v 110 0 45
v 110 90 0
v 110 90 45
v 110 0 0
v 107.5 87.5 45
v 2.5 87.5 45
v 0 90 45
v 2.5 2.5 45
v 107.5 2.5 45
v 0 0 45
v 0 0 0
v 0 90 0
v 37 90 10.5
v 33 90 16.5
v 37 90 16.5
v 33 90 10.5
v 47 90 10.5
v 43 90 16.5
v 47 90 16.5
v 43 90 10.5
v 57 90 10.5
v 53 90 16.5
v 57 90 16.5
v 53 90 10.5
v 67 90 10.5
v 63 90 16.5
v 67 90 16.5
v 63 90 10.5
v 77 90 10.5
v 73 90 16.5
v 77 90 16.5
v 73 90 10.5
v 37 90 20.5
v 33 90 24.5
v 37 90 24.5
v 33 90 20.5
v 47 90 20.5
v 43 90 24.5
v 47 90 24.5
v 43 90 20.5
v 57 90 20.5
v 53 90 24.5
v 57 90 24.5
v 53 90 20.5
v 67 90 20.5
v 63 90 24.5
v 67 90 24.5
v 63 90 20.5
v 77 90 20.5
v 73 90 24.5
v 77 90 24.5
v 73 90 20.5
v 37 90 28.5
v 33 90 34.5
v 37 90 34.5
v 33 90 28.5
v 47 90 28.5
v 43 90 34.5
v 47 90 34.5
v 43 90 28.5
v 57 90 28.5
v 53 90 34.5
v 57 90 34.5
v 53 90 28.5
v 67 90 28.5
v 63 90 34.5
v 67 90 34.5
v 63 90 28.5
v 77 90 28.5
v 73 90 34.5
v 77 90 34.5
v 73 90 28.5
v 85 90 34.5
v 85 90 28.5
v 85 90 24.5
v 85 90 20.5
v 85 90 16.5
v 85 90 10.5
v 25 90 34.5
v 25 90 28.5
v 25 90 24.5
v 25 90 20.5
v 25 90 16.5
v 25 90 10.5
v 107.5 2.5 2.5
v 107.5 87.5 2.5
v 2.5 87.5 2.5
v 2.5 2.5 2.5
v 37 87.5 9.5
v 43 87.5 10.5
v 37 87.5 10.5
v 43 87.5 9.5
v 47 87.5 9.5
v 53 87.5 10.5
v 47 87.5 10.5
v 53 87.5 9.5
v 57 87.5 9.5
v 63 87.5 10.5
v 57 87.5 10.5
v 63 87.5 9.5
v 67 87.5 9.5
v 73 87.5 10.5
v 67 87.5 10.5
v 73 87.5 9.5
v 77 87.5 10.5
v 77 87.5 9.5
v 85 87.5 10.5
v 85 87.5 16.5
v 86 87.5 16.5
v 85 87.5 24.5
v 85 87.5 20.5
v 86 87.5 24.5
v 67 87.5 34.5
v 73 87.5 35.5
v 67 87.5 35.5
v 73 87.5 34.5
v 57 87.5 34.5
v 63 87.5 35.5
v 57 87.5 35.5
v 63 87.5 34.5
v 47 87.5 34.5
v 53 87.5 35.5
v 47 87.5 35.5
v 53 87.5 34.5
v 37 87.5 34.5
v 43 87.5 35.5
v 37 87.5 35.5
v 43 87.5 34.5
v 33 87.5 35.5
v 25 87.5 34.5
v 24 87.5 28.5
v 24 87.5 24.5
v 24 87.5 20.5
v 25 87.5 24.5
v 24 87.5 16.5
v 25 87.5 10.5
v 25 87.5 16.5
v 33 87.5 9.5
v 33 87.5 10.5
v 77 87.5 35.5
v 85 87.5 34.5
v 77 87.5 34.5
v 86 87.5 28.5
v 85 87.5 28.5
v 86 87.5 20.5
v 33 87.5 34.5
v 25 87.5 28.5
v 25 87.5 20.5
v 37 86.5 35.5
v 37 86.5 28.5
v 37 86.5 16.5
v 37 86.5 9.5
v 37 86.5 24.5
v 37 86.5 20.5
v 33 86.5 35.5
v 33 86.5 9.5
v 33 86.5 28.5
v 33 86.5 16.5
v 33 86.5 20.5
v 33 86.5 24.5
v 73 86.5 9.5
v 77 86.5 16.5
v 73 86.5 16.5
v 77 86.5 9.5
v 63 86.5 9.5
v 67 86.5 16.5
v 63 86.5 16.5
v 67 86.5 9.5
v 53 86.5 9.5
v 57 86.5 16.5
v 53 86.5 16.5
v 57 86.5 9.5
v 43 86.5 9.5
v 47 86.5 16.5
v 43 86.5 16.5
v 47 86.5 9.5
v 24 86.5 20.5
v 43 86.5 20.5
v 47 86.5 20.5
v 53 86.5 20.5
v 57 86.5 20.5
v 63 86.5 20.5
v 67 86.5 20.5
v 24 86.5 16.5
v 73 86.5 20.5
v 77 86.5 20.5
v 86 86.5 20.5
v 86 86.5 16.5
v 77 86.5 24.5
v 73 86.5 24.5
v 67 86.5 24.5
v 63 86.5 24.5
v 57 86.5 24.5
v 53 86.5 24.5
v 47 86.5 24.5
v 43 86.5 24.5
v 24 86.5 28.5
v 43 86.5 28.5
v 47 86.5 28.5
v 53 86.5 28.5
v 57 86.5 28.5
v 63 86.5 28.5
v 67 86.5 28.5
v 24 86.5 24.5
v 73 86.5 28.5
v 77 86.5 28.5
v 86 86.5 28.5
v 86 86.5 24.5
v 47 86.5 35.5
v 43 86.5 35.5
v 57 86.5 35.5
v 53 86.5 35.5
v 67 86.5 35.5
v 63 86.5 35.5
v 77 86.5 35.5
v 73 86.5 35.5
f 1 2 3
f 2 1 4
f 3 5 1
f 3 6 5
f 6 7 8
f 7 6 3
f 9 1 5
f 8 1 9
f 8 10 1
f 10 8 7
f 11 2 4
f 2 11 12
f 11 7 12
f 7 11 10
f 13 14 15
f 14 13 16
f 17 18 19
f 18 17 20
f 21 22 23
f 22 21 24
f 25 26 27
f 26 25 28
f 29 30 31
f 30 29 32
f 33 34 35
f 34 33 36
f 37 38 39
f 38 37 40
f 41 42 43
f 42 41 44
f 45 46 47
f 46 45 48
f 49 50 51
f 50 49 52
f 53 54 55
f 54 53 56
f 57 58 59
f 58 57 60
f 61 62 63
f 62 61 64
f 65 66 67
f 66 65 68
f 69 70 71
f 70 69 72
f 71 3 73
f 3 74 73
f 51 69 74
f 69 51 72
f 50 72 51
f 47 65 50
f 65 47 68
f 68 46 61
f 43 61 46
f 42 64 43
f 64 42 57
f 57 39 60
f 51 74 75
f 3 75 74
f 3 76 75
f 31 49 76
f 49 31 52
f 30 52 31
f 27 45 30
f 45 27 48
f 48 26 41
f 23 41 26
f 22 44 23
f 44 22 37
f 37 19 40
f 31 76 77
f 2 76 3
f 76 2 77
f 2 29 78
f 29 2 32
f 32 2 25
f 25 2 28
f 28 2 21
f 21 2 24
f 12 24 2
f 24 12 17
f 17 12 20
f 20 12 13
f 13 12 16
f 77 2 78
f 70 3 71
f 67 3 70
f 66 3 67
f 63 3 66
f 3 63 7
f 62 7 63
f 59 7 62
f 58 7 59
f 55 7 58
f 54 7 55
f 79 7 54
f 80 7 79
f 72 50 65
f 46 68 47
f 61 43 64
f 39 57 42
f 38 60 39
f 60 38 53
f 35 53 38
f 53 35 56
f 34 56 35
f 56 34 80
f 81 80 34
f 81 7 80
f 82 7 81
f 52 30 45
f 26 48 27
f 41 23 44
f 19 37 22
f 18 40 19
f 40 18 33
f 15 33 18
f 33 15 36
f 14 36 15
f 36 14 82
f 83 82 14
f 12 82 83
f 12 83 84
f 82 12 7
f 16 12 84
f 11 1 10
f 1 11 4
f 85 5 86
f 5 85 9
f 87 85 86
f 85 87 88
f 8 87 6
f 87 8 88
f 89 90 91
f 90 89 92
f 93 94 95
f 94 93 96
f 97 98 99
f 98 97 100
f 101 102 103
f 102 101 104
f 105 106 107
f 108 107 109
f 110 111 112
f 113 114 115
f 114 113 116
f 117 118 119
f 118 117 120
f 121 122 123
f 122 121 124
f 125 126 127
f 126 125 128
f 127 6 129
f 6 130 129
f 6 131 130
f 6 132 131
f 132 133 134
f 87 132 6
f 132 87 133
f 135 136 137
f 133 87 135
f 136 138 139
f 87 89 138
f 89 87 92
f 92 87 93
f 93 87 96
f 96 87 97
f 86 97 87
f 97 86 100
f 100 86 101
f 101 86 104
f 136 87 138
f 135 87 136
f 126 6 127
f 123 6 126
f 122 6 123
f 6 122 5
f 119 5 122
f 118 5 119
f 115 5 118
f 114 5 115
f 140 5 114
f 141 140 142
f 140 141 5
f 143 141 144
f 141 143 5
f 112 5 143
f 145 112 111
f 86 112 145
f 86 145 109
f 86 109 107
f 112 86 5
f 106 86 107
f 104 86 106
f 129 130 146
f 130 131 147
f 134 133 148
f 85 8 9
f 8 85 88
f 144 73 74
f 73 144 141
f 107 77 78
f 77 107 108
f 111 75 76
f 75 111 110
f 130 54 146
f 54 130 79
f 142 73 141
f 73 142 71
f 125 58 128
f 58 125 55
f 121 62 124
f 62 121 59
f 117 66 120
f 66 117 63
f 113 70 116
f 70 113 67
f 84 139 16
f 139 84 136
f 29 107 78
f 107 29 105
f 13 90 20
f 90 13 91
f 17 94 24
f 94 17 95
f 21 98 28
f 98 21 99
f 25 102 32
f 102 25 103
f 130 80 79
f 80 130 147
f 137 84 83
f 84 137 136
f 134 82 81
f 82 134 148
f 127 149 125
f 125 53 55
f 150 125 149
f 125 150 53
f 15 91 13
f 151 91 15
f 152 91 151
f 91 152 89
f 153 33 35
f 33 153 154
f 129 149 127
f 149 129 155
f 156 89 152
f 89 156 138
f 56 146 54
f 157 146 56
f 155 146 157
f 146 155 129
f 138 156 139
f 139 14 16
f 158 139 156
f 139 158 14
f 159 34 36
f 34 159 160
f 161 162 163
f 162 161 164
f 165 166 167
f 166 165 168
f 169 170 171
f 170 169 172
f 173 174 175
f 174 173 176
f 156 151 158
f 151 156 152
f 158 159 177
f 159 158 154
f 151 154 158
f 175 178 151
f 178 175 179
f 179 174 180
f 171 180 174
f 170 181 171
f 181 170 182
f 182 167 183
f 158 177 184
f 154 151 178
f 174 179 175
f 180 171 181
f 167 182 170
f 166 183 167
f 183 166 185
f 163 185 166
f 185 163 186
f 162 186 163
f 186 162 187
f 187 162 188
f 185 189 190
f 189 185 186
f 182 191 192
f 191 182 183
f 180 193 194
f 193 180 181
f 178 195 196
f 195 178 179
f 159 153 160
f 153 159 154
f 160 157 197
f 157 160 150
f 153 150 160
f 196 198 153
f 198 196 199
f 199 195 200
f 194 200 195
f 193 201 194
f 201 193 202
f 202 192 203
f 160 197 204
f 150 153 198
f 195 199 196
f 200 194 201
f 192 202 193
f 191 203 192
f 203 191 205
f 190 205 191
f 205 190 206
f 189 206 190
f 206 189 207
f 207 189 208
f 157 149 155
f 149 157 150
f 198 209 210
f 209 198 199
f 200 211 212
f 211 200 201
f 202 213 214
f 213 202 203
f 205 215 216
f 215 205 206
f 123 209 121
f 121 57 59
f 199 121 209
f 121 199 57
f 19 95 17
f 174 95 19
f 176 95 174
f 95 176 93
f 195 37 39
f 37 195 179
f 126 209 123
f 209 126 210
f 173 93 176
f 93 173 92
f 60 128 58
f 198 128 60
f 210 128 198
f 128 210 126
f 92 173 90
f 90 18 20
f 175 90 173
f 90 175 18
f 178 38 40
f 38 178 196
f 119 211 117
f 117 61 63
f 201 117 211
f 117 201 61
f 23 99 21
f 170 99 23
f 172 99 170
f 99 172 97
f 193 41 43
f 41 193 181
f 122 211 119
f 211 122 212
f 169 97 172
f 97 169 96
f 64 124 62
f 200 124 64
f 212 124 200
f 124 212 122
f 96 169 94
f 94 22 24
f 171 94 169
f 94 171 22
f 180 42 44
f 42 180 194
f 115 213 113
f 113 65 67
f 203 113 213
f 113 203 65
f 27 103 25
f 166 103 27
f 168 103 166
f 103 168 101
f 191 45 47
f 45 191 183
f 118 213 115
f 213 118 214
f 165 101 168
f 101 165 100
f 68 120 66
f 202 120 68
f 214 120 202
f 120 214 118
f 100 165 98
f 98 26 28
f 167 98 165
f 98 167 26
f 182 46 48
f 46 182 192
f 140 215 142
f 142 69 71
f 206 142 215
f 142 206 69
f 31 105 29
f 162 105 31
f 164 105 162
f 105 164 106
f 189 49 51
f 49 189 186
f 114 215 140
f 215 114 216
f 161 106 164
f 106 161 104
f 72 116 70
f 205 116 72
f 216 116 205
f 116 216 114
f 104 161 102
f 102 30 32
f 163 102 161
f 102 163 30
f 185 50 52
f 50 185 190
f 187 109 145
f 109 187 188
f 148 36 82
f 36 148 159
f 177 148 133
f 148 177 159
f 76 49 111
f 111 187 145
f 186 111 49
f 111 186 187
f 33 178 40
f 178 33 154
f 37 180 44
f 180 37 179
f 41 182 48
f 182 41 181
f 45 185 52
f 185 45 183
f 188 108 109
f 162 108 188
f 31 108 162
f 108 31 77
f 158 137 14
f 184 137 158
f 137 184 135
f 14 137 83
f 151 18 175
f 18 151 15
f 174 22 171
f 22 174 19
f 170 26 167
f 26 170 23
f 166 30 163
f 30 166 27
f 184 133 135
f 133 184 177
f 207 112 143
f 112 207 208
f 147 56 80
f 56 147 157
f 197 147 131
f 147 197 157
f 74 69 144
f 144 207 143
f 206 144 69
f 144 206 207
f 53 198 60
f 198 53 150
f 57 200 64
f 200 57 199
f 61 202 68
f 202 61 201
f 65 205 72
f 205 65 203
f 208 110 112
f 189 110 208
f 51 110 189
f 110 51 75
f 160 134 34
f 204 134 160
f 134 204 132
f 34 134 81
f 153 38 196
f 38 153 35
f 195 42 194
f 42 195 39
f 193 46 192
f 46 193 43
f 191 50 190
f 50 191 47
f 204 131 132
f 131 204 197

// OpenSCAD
$fn = 32;

// ----------------------------------------------------------------------
// Vent box: crossgrid enclosure
// ----------------------------------------------------------------------

// --- parameters (mm) ---
box_l = 110;              // box length, X
box_w = 90;               // box width, Y
box_h = 45;               // box height, Z
wall_t = 2.5;             // shell wall thickness
win_l = 60;               // vent window width, X
win_h = 24;               // vent window height, Z
bar_w = 4;                // grid bar width
n_v = 5;                  // vertical bar count
n_h = 2;                  // horizontal bar count

win_z0 = (box_h - win_h) / 2;  // window lower edge Z
v_step = win_l / (n_v + 1);  // vertical bar step
h_step = win_h / (n_h + 1);  // horizontal bar step

difference() {
  union() {
    difference() {
      cube([box_l, box_w, box_h]);
  translate([wall_t, wall_t, wall_t])
    cube([box_l - 2 * wall_t, box_w - 2 * wall_t, box_h]);
  translate([(box_l - win_l) / 2, box_w - wall_t - 1, win_z0])
    cube([win_l, wall_t + 2, win_h]);
    }
    for (i = [1 : n_v])
      translate([(box_l - win_l) / 2 + i * v_step - bar_w / 2,
                 box_w - wall_t - 1, win_z0 - 1])
        cube([bar_w, wall_t + 1, win_h + 2]);
    for (i = [1 : n_h])
      translate([(box_l - win_l) / 2 - 1, box_w - wall_t - 1,
                 win_z0 + i * h_step - bar_w / 2])
        cube([win_l + 2, wall_t + 1, bar_w]);
  }
}
